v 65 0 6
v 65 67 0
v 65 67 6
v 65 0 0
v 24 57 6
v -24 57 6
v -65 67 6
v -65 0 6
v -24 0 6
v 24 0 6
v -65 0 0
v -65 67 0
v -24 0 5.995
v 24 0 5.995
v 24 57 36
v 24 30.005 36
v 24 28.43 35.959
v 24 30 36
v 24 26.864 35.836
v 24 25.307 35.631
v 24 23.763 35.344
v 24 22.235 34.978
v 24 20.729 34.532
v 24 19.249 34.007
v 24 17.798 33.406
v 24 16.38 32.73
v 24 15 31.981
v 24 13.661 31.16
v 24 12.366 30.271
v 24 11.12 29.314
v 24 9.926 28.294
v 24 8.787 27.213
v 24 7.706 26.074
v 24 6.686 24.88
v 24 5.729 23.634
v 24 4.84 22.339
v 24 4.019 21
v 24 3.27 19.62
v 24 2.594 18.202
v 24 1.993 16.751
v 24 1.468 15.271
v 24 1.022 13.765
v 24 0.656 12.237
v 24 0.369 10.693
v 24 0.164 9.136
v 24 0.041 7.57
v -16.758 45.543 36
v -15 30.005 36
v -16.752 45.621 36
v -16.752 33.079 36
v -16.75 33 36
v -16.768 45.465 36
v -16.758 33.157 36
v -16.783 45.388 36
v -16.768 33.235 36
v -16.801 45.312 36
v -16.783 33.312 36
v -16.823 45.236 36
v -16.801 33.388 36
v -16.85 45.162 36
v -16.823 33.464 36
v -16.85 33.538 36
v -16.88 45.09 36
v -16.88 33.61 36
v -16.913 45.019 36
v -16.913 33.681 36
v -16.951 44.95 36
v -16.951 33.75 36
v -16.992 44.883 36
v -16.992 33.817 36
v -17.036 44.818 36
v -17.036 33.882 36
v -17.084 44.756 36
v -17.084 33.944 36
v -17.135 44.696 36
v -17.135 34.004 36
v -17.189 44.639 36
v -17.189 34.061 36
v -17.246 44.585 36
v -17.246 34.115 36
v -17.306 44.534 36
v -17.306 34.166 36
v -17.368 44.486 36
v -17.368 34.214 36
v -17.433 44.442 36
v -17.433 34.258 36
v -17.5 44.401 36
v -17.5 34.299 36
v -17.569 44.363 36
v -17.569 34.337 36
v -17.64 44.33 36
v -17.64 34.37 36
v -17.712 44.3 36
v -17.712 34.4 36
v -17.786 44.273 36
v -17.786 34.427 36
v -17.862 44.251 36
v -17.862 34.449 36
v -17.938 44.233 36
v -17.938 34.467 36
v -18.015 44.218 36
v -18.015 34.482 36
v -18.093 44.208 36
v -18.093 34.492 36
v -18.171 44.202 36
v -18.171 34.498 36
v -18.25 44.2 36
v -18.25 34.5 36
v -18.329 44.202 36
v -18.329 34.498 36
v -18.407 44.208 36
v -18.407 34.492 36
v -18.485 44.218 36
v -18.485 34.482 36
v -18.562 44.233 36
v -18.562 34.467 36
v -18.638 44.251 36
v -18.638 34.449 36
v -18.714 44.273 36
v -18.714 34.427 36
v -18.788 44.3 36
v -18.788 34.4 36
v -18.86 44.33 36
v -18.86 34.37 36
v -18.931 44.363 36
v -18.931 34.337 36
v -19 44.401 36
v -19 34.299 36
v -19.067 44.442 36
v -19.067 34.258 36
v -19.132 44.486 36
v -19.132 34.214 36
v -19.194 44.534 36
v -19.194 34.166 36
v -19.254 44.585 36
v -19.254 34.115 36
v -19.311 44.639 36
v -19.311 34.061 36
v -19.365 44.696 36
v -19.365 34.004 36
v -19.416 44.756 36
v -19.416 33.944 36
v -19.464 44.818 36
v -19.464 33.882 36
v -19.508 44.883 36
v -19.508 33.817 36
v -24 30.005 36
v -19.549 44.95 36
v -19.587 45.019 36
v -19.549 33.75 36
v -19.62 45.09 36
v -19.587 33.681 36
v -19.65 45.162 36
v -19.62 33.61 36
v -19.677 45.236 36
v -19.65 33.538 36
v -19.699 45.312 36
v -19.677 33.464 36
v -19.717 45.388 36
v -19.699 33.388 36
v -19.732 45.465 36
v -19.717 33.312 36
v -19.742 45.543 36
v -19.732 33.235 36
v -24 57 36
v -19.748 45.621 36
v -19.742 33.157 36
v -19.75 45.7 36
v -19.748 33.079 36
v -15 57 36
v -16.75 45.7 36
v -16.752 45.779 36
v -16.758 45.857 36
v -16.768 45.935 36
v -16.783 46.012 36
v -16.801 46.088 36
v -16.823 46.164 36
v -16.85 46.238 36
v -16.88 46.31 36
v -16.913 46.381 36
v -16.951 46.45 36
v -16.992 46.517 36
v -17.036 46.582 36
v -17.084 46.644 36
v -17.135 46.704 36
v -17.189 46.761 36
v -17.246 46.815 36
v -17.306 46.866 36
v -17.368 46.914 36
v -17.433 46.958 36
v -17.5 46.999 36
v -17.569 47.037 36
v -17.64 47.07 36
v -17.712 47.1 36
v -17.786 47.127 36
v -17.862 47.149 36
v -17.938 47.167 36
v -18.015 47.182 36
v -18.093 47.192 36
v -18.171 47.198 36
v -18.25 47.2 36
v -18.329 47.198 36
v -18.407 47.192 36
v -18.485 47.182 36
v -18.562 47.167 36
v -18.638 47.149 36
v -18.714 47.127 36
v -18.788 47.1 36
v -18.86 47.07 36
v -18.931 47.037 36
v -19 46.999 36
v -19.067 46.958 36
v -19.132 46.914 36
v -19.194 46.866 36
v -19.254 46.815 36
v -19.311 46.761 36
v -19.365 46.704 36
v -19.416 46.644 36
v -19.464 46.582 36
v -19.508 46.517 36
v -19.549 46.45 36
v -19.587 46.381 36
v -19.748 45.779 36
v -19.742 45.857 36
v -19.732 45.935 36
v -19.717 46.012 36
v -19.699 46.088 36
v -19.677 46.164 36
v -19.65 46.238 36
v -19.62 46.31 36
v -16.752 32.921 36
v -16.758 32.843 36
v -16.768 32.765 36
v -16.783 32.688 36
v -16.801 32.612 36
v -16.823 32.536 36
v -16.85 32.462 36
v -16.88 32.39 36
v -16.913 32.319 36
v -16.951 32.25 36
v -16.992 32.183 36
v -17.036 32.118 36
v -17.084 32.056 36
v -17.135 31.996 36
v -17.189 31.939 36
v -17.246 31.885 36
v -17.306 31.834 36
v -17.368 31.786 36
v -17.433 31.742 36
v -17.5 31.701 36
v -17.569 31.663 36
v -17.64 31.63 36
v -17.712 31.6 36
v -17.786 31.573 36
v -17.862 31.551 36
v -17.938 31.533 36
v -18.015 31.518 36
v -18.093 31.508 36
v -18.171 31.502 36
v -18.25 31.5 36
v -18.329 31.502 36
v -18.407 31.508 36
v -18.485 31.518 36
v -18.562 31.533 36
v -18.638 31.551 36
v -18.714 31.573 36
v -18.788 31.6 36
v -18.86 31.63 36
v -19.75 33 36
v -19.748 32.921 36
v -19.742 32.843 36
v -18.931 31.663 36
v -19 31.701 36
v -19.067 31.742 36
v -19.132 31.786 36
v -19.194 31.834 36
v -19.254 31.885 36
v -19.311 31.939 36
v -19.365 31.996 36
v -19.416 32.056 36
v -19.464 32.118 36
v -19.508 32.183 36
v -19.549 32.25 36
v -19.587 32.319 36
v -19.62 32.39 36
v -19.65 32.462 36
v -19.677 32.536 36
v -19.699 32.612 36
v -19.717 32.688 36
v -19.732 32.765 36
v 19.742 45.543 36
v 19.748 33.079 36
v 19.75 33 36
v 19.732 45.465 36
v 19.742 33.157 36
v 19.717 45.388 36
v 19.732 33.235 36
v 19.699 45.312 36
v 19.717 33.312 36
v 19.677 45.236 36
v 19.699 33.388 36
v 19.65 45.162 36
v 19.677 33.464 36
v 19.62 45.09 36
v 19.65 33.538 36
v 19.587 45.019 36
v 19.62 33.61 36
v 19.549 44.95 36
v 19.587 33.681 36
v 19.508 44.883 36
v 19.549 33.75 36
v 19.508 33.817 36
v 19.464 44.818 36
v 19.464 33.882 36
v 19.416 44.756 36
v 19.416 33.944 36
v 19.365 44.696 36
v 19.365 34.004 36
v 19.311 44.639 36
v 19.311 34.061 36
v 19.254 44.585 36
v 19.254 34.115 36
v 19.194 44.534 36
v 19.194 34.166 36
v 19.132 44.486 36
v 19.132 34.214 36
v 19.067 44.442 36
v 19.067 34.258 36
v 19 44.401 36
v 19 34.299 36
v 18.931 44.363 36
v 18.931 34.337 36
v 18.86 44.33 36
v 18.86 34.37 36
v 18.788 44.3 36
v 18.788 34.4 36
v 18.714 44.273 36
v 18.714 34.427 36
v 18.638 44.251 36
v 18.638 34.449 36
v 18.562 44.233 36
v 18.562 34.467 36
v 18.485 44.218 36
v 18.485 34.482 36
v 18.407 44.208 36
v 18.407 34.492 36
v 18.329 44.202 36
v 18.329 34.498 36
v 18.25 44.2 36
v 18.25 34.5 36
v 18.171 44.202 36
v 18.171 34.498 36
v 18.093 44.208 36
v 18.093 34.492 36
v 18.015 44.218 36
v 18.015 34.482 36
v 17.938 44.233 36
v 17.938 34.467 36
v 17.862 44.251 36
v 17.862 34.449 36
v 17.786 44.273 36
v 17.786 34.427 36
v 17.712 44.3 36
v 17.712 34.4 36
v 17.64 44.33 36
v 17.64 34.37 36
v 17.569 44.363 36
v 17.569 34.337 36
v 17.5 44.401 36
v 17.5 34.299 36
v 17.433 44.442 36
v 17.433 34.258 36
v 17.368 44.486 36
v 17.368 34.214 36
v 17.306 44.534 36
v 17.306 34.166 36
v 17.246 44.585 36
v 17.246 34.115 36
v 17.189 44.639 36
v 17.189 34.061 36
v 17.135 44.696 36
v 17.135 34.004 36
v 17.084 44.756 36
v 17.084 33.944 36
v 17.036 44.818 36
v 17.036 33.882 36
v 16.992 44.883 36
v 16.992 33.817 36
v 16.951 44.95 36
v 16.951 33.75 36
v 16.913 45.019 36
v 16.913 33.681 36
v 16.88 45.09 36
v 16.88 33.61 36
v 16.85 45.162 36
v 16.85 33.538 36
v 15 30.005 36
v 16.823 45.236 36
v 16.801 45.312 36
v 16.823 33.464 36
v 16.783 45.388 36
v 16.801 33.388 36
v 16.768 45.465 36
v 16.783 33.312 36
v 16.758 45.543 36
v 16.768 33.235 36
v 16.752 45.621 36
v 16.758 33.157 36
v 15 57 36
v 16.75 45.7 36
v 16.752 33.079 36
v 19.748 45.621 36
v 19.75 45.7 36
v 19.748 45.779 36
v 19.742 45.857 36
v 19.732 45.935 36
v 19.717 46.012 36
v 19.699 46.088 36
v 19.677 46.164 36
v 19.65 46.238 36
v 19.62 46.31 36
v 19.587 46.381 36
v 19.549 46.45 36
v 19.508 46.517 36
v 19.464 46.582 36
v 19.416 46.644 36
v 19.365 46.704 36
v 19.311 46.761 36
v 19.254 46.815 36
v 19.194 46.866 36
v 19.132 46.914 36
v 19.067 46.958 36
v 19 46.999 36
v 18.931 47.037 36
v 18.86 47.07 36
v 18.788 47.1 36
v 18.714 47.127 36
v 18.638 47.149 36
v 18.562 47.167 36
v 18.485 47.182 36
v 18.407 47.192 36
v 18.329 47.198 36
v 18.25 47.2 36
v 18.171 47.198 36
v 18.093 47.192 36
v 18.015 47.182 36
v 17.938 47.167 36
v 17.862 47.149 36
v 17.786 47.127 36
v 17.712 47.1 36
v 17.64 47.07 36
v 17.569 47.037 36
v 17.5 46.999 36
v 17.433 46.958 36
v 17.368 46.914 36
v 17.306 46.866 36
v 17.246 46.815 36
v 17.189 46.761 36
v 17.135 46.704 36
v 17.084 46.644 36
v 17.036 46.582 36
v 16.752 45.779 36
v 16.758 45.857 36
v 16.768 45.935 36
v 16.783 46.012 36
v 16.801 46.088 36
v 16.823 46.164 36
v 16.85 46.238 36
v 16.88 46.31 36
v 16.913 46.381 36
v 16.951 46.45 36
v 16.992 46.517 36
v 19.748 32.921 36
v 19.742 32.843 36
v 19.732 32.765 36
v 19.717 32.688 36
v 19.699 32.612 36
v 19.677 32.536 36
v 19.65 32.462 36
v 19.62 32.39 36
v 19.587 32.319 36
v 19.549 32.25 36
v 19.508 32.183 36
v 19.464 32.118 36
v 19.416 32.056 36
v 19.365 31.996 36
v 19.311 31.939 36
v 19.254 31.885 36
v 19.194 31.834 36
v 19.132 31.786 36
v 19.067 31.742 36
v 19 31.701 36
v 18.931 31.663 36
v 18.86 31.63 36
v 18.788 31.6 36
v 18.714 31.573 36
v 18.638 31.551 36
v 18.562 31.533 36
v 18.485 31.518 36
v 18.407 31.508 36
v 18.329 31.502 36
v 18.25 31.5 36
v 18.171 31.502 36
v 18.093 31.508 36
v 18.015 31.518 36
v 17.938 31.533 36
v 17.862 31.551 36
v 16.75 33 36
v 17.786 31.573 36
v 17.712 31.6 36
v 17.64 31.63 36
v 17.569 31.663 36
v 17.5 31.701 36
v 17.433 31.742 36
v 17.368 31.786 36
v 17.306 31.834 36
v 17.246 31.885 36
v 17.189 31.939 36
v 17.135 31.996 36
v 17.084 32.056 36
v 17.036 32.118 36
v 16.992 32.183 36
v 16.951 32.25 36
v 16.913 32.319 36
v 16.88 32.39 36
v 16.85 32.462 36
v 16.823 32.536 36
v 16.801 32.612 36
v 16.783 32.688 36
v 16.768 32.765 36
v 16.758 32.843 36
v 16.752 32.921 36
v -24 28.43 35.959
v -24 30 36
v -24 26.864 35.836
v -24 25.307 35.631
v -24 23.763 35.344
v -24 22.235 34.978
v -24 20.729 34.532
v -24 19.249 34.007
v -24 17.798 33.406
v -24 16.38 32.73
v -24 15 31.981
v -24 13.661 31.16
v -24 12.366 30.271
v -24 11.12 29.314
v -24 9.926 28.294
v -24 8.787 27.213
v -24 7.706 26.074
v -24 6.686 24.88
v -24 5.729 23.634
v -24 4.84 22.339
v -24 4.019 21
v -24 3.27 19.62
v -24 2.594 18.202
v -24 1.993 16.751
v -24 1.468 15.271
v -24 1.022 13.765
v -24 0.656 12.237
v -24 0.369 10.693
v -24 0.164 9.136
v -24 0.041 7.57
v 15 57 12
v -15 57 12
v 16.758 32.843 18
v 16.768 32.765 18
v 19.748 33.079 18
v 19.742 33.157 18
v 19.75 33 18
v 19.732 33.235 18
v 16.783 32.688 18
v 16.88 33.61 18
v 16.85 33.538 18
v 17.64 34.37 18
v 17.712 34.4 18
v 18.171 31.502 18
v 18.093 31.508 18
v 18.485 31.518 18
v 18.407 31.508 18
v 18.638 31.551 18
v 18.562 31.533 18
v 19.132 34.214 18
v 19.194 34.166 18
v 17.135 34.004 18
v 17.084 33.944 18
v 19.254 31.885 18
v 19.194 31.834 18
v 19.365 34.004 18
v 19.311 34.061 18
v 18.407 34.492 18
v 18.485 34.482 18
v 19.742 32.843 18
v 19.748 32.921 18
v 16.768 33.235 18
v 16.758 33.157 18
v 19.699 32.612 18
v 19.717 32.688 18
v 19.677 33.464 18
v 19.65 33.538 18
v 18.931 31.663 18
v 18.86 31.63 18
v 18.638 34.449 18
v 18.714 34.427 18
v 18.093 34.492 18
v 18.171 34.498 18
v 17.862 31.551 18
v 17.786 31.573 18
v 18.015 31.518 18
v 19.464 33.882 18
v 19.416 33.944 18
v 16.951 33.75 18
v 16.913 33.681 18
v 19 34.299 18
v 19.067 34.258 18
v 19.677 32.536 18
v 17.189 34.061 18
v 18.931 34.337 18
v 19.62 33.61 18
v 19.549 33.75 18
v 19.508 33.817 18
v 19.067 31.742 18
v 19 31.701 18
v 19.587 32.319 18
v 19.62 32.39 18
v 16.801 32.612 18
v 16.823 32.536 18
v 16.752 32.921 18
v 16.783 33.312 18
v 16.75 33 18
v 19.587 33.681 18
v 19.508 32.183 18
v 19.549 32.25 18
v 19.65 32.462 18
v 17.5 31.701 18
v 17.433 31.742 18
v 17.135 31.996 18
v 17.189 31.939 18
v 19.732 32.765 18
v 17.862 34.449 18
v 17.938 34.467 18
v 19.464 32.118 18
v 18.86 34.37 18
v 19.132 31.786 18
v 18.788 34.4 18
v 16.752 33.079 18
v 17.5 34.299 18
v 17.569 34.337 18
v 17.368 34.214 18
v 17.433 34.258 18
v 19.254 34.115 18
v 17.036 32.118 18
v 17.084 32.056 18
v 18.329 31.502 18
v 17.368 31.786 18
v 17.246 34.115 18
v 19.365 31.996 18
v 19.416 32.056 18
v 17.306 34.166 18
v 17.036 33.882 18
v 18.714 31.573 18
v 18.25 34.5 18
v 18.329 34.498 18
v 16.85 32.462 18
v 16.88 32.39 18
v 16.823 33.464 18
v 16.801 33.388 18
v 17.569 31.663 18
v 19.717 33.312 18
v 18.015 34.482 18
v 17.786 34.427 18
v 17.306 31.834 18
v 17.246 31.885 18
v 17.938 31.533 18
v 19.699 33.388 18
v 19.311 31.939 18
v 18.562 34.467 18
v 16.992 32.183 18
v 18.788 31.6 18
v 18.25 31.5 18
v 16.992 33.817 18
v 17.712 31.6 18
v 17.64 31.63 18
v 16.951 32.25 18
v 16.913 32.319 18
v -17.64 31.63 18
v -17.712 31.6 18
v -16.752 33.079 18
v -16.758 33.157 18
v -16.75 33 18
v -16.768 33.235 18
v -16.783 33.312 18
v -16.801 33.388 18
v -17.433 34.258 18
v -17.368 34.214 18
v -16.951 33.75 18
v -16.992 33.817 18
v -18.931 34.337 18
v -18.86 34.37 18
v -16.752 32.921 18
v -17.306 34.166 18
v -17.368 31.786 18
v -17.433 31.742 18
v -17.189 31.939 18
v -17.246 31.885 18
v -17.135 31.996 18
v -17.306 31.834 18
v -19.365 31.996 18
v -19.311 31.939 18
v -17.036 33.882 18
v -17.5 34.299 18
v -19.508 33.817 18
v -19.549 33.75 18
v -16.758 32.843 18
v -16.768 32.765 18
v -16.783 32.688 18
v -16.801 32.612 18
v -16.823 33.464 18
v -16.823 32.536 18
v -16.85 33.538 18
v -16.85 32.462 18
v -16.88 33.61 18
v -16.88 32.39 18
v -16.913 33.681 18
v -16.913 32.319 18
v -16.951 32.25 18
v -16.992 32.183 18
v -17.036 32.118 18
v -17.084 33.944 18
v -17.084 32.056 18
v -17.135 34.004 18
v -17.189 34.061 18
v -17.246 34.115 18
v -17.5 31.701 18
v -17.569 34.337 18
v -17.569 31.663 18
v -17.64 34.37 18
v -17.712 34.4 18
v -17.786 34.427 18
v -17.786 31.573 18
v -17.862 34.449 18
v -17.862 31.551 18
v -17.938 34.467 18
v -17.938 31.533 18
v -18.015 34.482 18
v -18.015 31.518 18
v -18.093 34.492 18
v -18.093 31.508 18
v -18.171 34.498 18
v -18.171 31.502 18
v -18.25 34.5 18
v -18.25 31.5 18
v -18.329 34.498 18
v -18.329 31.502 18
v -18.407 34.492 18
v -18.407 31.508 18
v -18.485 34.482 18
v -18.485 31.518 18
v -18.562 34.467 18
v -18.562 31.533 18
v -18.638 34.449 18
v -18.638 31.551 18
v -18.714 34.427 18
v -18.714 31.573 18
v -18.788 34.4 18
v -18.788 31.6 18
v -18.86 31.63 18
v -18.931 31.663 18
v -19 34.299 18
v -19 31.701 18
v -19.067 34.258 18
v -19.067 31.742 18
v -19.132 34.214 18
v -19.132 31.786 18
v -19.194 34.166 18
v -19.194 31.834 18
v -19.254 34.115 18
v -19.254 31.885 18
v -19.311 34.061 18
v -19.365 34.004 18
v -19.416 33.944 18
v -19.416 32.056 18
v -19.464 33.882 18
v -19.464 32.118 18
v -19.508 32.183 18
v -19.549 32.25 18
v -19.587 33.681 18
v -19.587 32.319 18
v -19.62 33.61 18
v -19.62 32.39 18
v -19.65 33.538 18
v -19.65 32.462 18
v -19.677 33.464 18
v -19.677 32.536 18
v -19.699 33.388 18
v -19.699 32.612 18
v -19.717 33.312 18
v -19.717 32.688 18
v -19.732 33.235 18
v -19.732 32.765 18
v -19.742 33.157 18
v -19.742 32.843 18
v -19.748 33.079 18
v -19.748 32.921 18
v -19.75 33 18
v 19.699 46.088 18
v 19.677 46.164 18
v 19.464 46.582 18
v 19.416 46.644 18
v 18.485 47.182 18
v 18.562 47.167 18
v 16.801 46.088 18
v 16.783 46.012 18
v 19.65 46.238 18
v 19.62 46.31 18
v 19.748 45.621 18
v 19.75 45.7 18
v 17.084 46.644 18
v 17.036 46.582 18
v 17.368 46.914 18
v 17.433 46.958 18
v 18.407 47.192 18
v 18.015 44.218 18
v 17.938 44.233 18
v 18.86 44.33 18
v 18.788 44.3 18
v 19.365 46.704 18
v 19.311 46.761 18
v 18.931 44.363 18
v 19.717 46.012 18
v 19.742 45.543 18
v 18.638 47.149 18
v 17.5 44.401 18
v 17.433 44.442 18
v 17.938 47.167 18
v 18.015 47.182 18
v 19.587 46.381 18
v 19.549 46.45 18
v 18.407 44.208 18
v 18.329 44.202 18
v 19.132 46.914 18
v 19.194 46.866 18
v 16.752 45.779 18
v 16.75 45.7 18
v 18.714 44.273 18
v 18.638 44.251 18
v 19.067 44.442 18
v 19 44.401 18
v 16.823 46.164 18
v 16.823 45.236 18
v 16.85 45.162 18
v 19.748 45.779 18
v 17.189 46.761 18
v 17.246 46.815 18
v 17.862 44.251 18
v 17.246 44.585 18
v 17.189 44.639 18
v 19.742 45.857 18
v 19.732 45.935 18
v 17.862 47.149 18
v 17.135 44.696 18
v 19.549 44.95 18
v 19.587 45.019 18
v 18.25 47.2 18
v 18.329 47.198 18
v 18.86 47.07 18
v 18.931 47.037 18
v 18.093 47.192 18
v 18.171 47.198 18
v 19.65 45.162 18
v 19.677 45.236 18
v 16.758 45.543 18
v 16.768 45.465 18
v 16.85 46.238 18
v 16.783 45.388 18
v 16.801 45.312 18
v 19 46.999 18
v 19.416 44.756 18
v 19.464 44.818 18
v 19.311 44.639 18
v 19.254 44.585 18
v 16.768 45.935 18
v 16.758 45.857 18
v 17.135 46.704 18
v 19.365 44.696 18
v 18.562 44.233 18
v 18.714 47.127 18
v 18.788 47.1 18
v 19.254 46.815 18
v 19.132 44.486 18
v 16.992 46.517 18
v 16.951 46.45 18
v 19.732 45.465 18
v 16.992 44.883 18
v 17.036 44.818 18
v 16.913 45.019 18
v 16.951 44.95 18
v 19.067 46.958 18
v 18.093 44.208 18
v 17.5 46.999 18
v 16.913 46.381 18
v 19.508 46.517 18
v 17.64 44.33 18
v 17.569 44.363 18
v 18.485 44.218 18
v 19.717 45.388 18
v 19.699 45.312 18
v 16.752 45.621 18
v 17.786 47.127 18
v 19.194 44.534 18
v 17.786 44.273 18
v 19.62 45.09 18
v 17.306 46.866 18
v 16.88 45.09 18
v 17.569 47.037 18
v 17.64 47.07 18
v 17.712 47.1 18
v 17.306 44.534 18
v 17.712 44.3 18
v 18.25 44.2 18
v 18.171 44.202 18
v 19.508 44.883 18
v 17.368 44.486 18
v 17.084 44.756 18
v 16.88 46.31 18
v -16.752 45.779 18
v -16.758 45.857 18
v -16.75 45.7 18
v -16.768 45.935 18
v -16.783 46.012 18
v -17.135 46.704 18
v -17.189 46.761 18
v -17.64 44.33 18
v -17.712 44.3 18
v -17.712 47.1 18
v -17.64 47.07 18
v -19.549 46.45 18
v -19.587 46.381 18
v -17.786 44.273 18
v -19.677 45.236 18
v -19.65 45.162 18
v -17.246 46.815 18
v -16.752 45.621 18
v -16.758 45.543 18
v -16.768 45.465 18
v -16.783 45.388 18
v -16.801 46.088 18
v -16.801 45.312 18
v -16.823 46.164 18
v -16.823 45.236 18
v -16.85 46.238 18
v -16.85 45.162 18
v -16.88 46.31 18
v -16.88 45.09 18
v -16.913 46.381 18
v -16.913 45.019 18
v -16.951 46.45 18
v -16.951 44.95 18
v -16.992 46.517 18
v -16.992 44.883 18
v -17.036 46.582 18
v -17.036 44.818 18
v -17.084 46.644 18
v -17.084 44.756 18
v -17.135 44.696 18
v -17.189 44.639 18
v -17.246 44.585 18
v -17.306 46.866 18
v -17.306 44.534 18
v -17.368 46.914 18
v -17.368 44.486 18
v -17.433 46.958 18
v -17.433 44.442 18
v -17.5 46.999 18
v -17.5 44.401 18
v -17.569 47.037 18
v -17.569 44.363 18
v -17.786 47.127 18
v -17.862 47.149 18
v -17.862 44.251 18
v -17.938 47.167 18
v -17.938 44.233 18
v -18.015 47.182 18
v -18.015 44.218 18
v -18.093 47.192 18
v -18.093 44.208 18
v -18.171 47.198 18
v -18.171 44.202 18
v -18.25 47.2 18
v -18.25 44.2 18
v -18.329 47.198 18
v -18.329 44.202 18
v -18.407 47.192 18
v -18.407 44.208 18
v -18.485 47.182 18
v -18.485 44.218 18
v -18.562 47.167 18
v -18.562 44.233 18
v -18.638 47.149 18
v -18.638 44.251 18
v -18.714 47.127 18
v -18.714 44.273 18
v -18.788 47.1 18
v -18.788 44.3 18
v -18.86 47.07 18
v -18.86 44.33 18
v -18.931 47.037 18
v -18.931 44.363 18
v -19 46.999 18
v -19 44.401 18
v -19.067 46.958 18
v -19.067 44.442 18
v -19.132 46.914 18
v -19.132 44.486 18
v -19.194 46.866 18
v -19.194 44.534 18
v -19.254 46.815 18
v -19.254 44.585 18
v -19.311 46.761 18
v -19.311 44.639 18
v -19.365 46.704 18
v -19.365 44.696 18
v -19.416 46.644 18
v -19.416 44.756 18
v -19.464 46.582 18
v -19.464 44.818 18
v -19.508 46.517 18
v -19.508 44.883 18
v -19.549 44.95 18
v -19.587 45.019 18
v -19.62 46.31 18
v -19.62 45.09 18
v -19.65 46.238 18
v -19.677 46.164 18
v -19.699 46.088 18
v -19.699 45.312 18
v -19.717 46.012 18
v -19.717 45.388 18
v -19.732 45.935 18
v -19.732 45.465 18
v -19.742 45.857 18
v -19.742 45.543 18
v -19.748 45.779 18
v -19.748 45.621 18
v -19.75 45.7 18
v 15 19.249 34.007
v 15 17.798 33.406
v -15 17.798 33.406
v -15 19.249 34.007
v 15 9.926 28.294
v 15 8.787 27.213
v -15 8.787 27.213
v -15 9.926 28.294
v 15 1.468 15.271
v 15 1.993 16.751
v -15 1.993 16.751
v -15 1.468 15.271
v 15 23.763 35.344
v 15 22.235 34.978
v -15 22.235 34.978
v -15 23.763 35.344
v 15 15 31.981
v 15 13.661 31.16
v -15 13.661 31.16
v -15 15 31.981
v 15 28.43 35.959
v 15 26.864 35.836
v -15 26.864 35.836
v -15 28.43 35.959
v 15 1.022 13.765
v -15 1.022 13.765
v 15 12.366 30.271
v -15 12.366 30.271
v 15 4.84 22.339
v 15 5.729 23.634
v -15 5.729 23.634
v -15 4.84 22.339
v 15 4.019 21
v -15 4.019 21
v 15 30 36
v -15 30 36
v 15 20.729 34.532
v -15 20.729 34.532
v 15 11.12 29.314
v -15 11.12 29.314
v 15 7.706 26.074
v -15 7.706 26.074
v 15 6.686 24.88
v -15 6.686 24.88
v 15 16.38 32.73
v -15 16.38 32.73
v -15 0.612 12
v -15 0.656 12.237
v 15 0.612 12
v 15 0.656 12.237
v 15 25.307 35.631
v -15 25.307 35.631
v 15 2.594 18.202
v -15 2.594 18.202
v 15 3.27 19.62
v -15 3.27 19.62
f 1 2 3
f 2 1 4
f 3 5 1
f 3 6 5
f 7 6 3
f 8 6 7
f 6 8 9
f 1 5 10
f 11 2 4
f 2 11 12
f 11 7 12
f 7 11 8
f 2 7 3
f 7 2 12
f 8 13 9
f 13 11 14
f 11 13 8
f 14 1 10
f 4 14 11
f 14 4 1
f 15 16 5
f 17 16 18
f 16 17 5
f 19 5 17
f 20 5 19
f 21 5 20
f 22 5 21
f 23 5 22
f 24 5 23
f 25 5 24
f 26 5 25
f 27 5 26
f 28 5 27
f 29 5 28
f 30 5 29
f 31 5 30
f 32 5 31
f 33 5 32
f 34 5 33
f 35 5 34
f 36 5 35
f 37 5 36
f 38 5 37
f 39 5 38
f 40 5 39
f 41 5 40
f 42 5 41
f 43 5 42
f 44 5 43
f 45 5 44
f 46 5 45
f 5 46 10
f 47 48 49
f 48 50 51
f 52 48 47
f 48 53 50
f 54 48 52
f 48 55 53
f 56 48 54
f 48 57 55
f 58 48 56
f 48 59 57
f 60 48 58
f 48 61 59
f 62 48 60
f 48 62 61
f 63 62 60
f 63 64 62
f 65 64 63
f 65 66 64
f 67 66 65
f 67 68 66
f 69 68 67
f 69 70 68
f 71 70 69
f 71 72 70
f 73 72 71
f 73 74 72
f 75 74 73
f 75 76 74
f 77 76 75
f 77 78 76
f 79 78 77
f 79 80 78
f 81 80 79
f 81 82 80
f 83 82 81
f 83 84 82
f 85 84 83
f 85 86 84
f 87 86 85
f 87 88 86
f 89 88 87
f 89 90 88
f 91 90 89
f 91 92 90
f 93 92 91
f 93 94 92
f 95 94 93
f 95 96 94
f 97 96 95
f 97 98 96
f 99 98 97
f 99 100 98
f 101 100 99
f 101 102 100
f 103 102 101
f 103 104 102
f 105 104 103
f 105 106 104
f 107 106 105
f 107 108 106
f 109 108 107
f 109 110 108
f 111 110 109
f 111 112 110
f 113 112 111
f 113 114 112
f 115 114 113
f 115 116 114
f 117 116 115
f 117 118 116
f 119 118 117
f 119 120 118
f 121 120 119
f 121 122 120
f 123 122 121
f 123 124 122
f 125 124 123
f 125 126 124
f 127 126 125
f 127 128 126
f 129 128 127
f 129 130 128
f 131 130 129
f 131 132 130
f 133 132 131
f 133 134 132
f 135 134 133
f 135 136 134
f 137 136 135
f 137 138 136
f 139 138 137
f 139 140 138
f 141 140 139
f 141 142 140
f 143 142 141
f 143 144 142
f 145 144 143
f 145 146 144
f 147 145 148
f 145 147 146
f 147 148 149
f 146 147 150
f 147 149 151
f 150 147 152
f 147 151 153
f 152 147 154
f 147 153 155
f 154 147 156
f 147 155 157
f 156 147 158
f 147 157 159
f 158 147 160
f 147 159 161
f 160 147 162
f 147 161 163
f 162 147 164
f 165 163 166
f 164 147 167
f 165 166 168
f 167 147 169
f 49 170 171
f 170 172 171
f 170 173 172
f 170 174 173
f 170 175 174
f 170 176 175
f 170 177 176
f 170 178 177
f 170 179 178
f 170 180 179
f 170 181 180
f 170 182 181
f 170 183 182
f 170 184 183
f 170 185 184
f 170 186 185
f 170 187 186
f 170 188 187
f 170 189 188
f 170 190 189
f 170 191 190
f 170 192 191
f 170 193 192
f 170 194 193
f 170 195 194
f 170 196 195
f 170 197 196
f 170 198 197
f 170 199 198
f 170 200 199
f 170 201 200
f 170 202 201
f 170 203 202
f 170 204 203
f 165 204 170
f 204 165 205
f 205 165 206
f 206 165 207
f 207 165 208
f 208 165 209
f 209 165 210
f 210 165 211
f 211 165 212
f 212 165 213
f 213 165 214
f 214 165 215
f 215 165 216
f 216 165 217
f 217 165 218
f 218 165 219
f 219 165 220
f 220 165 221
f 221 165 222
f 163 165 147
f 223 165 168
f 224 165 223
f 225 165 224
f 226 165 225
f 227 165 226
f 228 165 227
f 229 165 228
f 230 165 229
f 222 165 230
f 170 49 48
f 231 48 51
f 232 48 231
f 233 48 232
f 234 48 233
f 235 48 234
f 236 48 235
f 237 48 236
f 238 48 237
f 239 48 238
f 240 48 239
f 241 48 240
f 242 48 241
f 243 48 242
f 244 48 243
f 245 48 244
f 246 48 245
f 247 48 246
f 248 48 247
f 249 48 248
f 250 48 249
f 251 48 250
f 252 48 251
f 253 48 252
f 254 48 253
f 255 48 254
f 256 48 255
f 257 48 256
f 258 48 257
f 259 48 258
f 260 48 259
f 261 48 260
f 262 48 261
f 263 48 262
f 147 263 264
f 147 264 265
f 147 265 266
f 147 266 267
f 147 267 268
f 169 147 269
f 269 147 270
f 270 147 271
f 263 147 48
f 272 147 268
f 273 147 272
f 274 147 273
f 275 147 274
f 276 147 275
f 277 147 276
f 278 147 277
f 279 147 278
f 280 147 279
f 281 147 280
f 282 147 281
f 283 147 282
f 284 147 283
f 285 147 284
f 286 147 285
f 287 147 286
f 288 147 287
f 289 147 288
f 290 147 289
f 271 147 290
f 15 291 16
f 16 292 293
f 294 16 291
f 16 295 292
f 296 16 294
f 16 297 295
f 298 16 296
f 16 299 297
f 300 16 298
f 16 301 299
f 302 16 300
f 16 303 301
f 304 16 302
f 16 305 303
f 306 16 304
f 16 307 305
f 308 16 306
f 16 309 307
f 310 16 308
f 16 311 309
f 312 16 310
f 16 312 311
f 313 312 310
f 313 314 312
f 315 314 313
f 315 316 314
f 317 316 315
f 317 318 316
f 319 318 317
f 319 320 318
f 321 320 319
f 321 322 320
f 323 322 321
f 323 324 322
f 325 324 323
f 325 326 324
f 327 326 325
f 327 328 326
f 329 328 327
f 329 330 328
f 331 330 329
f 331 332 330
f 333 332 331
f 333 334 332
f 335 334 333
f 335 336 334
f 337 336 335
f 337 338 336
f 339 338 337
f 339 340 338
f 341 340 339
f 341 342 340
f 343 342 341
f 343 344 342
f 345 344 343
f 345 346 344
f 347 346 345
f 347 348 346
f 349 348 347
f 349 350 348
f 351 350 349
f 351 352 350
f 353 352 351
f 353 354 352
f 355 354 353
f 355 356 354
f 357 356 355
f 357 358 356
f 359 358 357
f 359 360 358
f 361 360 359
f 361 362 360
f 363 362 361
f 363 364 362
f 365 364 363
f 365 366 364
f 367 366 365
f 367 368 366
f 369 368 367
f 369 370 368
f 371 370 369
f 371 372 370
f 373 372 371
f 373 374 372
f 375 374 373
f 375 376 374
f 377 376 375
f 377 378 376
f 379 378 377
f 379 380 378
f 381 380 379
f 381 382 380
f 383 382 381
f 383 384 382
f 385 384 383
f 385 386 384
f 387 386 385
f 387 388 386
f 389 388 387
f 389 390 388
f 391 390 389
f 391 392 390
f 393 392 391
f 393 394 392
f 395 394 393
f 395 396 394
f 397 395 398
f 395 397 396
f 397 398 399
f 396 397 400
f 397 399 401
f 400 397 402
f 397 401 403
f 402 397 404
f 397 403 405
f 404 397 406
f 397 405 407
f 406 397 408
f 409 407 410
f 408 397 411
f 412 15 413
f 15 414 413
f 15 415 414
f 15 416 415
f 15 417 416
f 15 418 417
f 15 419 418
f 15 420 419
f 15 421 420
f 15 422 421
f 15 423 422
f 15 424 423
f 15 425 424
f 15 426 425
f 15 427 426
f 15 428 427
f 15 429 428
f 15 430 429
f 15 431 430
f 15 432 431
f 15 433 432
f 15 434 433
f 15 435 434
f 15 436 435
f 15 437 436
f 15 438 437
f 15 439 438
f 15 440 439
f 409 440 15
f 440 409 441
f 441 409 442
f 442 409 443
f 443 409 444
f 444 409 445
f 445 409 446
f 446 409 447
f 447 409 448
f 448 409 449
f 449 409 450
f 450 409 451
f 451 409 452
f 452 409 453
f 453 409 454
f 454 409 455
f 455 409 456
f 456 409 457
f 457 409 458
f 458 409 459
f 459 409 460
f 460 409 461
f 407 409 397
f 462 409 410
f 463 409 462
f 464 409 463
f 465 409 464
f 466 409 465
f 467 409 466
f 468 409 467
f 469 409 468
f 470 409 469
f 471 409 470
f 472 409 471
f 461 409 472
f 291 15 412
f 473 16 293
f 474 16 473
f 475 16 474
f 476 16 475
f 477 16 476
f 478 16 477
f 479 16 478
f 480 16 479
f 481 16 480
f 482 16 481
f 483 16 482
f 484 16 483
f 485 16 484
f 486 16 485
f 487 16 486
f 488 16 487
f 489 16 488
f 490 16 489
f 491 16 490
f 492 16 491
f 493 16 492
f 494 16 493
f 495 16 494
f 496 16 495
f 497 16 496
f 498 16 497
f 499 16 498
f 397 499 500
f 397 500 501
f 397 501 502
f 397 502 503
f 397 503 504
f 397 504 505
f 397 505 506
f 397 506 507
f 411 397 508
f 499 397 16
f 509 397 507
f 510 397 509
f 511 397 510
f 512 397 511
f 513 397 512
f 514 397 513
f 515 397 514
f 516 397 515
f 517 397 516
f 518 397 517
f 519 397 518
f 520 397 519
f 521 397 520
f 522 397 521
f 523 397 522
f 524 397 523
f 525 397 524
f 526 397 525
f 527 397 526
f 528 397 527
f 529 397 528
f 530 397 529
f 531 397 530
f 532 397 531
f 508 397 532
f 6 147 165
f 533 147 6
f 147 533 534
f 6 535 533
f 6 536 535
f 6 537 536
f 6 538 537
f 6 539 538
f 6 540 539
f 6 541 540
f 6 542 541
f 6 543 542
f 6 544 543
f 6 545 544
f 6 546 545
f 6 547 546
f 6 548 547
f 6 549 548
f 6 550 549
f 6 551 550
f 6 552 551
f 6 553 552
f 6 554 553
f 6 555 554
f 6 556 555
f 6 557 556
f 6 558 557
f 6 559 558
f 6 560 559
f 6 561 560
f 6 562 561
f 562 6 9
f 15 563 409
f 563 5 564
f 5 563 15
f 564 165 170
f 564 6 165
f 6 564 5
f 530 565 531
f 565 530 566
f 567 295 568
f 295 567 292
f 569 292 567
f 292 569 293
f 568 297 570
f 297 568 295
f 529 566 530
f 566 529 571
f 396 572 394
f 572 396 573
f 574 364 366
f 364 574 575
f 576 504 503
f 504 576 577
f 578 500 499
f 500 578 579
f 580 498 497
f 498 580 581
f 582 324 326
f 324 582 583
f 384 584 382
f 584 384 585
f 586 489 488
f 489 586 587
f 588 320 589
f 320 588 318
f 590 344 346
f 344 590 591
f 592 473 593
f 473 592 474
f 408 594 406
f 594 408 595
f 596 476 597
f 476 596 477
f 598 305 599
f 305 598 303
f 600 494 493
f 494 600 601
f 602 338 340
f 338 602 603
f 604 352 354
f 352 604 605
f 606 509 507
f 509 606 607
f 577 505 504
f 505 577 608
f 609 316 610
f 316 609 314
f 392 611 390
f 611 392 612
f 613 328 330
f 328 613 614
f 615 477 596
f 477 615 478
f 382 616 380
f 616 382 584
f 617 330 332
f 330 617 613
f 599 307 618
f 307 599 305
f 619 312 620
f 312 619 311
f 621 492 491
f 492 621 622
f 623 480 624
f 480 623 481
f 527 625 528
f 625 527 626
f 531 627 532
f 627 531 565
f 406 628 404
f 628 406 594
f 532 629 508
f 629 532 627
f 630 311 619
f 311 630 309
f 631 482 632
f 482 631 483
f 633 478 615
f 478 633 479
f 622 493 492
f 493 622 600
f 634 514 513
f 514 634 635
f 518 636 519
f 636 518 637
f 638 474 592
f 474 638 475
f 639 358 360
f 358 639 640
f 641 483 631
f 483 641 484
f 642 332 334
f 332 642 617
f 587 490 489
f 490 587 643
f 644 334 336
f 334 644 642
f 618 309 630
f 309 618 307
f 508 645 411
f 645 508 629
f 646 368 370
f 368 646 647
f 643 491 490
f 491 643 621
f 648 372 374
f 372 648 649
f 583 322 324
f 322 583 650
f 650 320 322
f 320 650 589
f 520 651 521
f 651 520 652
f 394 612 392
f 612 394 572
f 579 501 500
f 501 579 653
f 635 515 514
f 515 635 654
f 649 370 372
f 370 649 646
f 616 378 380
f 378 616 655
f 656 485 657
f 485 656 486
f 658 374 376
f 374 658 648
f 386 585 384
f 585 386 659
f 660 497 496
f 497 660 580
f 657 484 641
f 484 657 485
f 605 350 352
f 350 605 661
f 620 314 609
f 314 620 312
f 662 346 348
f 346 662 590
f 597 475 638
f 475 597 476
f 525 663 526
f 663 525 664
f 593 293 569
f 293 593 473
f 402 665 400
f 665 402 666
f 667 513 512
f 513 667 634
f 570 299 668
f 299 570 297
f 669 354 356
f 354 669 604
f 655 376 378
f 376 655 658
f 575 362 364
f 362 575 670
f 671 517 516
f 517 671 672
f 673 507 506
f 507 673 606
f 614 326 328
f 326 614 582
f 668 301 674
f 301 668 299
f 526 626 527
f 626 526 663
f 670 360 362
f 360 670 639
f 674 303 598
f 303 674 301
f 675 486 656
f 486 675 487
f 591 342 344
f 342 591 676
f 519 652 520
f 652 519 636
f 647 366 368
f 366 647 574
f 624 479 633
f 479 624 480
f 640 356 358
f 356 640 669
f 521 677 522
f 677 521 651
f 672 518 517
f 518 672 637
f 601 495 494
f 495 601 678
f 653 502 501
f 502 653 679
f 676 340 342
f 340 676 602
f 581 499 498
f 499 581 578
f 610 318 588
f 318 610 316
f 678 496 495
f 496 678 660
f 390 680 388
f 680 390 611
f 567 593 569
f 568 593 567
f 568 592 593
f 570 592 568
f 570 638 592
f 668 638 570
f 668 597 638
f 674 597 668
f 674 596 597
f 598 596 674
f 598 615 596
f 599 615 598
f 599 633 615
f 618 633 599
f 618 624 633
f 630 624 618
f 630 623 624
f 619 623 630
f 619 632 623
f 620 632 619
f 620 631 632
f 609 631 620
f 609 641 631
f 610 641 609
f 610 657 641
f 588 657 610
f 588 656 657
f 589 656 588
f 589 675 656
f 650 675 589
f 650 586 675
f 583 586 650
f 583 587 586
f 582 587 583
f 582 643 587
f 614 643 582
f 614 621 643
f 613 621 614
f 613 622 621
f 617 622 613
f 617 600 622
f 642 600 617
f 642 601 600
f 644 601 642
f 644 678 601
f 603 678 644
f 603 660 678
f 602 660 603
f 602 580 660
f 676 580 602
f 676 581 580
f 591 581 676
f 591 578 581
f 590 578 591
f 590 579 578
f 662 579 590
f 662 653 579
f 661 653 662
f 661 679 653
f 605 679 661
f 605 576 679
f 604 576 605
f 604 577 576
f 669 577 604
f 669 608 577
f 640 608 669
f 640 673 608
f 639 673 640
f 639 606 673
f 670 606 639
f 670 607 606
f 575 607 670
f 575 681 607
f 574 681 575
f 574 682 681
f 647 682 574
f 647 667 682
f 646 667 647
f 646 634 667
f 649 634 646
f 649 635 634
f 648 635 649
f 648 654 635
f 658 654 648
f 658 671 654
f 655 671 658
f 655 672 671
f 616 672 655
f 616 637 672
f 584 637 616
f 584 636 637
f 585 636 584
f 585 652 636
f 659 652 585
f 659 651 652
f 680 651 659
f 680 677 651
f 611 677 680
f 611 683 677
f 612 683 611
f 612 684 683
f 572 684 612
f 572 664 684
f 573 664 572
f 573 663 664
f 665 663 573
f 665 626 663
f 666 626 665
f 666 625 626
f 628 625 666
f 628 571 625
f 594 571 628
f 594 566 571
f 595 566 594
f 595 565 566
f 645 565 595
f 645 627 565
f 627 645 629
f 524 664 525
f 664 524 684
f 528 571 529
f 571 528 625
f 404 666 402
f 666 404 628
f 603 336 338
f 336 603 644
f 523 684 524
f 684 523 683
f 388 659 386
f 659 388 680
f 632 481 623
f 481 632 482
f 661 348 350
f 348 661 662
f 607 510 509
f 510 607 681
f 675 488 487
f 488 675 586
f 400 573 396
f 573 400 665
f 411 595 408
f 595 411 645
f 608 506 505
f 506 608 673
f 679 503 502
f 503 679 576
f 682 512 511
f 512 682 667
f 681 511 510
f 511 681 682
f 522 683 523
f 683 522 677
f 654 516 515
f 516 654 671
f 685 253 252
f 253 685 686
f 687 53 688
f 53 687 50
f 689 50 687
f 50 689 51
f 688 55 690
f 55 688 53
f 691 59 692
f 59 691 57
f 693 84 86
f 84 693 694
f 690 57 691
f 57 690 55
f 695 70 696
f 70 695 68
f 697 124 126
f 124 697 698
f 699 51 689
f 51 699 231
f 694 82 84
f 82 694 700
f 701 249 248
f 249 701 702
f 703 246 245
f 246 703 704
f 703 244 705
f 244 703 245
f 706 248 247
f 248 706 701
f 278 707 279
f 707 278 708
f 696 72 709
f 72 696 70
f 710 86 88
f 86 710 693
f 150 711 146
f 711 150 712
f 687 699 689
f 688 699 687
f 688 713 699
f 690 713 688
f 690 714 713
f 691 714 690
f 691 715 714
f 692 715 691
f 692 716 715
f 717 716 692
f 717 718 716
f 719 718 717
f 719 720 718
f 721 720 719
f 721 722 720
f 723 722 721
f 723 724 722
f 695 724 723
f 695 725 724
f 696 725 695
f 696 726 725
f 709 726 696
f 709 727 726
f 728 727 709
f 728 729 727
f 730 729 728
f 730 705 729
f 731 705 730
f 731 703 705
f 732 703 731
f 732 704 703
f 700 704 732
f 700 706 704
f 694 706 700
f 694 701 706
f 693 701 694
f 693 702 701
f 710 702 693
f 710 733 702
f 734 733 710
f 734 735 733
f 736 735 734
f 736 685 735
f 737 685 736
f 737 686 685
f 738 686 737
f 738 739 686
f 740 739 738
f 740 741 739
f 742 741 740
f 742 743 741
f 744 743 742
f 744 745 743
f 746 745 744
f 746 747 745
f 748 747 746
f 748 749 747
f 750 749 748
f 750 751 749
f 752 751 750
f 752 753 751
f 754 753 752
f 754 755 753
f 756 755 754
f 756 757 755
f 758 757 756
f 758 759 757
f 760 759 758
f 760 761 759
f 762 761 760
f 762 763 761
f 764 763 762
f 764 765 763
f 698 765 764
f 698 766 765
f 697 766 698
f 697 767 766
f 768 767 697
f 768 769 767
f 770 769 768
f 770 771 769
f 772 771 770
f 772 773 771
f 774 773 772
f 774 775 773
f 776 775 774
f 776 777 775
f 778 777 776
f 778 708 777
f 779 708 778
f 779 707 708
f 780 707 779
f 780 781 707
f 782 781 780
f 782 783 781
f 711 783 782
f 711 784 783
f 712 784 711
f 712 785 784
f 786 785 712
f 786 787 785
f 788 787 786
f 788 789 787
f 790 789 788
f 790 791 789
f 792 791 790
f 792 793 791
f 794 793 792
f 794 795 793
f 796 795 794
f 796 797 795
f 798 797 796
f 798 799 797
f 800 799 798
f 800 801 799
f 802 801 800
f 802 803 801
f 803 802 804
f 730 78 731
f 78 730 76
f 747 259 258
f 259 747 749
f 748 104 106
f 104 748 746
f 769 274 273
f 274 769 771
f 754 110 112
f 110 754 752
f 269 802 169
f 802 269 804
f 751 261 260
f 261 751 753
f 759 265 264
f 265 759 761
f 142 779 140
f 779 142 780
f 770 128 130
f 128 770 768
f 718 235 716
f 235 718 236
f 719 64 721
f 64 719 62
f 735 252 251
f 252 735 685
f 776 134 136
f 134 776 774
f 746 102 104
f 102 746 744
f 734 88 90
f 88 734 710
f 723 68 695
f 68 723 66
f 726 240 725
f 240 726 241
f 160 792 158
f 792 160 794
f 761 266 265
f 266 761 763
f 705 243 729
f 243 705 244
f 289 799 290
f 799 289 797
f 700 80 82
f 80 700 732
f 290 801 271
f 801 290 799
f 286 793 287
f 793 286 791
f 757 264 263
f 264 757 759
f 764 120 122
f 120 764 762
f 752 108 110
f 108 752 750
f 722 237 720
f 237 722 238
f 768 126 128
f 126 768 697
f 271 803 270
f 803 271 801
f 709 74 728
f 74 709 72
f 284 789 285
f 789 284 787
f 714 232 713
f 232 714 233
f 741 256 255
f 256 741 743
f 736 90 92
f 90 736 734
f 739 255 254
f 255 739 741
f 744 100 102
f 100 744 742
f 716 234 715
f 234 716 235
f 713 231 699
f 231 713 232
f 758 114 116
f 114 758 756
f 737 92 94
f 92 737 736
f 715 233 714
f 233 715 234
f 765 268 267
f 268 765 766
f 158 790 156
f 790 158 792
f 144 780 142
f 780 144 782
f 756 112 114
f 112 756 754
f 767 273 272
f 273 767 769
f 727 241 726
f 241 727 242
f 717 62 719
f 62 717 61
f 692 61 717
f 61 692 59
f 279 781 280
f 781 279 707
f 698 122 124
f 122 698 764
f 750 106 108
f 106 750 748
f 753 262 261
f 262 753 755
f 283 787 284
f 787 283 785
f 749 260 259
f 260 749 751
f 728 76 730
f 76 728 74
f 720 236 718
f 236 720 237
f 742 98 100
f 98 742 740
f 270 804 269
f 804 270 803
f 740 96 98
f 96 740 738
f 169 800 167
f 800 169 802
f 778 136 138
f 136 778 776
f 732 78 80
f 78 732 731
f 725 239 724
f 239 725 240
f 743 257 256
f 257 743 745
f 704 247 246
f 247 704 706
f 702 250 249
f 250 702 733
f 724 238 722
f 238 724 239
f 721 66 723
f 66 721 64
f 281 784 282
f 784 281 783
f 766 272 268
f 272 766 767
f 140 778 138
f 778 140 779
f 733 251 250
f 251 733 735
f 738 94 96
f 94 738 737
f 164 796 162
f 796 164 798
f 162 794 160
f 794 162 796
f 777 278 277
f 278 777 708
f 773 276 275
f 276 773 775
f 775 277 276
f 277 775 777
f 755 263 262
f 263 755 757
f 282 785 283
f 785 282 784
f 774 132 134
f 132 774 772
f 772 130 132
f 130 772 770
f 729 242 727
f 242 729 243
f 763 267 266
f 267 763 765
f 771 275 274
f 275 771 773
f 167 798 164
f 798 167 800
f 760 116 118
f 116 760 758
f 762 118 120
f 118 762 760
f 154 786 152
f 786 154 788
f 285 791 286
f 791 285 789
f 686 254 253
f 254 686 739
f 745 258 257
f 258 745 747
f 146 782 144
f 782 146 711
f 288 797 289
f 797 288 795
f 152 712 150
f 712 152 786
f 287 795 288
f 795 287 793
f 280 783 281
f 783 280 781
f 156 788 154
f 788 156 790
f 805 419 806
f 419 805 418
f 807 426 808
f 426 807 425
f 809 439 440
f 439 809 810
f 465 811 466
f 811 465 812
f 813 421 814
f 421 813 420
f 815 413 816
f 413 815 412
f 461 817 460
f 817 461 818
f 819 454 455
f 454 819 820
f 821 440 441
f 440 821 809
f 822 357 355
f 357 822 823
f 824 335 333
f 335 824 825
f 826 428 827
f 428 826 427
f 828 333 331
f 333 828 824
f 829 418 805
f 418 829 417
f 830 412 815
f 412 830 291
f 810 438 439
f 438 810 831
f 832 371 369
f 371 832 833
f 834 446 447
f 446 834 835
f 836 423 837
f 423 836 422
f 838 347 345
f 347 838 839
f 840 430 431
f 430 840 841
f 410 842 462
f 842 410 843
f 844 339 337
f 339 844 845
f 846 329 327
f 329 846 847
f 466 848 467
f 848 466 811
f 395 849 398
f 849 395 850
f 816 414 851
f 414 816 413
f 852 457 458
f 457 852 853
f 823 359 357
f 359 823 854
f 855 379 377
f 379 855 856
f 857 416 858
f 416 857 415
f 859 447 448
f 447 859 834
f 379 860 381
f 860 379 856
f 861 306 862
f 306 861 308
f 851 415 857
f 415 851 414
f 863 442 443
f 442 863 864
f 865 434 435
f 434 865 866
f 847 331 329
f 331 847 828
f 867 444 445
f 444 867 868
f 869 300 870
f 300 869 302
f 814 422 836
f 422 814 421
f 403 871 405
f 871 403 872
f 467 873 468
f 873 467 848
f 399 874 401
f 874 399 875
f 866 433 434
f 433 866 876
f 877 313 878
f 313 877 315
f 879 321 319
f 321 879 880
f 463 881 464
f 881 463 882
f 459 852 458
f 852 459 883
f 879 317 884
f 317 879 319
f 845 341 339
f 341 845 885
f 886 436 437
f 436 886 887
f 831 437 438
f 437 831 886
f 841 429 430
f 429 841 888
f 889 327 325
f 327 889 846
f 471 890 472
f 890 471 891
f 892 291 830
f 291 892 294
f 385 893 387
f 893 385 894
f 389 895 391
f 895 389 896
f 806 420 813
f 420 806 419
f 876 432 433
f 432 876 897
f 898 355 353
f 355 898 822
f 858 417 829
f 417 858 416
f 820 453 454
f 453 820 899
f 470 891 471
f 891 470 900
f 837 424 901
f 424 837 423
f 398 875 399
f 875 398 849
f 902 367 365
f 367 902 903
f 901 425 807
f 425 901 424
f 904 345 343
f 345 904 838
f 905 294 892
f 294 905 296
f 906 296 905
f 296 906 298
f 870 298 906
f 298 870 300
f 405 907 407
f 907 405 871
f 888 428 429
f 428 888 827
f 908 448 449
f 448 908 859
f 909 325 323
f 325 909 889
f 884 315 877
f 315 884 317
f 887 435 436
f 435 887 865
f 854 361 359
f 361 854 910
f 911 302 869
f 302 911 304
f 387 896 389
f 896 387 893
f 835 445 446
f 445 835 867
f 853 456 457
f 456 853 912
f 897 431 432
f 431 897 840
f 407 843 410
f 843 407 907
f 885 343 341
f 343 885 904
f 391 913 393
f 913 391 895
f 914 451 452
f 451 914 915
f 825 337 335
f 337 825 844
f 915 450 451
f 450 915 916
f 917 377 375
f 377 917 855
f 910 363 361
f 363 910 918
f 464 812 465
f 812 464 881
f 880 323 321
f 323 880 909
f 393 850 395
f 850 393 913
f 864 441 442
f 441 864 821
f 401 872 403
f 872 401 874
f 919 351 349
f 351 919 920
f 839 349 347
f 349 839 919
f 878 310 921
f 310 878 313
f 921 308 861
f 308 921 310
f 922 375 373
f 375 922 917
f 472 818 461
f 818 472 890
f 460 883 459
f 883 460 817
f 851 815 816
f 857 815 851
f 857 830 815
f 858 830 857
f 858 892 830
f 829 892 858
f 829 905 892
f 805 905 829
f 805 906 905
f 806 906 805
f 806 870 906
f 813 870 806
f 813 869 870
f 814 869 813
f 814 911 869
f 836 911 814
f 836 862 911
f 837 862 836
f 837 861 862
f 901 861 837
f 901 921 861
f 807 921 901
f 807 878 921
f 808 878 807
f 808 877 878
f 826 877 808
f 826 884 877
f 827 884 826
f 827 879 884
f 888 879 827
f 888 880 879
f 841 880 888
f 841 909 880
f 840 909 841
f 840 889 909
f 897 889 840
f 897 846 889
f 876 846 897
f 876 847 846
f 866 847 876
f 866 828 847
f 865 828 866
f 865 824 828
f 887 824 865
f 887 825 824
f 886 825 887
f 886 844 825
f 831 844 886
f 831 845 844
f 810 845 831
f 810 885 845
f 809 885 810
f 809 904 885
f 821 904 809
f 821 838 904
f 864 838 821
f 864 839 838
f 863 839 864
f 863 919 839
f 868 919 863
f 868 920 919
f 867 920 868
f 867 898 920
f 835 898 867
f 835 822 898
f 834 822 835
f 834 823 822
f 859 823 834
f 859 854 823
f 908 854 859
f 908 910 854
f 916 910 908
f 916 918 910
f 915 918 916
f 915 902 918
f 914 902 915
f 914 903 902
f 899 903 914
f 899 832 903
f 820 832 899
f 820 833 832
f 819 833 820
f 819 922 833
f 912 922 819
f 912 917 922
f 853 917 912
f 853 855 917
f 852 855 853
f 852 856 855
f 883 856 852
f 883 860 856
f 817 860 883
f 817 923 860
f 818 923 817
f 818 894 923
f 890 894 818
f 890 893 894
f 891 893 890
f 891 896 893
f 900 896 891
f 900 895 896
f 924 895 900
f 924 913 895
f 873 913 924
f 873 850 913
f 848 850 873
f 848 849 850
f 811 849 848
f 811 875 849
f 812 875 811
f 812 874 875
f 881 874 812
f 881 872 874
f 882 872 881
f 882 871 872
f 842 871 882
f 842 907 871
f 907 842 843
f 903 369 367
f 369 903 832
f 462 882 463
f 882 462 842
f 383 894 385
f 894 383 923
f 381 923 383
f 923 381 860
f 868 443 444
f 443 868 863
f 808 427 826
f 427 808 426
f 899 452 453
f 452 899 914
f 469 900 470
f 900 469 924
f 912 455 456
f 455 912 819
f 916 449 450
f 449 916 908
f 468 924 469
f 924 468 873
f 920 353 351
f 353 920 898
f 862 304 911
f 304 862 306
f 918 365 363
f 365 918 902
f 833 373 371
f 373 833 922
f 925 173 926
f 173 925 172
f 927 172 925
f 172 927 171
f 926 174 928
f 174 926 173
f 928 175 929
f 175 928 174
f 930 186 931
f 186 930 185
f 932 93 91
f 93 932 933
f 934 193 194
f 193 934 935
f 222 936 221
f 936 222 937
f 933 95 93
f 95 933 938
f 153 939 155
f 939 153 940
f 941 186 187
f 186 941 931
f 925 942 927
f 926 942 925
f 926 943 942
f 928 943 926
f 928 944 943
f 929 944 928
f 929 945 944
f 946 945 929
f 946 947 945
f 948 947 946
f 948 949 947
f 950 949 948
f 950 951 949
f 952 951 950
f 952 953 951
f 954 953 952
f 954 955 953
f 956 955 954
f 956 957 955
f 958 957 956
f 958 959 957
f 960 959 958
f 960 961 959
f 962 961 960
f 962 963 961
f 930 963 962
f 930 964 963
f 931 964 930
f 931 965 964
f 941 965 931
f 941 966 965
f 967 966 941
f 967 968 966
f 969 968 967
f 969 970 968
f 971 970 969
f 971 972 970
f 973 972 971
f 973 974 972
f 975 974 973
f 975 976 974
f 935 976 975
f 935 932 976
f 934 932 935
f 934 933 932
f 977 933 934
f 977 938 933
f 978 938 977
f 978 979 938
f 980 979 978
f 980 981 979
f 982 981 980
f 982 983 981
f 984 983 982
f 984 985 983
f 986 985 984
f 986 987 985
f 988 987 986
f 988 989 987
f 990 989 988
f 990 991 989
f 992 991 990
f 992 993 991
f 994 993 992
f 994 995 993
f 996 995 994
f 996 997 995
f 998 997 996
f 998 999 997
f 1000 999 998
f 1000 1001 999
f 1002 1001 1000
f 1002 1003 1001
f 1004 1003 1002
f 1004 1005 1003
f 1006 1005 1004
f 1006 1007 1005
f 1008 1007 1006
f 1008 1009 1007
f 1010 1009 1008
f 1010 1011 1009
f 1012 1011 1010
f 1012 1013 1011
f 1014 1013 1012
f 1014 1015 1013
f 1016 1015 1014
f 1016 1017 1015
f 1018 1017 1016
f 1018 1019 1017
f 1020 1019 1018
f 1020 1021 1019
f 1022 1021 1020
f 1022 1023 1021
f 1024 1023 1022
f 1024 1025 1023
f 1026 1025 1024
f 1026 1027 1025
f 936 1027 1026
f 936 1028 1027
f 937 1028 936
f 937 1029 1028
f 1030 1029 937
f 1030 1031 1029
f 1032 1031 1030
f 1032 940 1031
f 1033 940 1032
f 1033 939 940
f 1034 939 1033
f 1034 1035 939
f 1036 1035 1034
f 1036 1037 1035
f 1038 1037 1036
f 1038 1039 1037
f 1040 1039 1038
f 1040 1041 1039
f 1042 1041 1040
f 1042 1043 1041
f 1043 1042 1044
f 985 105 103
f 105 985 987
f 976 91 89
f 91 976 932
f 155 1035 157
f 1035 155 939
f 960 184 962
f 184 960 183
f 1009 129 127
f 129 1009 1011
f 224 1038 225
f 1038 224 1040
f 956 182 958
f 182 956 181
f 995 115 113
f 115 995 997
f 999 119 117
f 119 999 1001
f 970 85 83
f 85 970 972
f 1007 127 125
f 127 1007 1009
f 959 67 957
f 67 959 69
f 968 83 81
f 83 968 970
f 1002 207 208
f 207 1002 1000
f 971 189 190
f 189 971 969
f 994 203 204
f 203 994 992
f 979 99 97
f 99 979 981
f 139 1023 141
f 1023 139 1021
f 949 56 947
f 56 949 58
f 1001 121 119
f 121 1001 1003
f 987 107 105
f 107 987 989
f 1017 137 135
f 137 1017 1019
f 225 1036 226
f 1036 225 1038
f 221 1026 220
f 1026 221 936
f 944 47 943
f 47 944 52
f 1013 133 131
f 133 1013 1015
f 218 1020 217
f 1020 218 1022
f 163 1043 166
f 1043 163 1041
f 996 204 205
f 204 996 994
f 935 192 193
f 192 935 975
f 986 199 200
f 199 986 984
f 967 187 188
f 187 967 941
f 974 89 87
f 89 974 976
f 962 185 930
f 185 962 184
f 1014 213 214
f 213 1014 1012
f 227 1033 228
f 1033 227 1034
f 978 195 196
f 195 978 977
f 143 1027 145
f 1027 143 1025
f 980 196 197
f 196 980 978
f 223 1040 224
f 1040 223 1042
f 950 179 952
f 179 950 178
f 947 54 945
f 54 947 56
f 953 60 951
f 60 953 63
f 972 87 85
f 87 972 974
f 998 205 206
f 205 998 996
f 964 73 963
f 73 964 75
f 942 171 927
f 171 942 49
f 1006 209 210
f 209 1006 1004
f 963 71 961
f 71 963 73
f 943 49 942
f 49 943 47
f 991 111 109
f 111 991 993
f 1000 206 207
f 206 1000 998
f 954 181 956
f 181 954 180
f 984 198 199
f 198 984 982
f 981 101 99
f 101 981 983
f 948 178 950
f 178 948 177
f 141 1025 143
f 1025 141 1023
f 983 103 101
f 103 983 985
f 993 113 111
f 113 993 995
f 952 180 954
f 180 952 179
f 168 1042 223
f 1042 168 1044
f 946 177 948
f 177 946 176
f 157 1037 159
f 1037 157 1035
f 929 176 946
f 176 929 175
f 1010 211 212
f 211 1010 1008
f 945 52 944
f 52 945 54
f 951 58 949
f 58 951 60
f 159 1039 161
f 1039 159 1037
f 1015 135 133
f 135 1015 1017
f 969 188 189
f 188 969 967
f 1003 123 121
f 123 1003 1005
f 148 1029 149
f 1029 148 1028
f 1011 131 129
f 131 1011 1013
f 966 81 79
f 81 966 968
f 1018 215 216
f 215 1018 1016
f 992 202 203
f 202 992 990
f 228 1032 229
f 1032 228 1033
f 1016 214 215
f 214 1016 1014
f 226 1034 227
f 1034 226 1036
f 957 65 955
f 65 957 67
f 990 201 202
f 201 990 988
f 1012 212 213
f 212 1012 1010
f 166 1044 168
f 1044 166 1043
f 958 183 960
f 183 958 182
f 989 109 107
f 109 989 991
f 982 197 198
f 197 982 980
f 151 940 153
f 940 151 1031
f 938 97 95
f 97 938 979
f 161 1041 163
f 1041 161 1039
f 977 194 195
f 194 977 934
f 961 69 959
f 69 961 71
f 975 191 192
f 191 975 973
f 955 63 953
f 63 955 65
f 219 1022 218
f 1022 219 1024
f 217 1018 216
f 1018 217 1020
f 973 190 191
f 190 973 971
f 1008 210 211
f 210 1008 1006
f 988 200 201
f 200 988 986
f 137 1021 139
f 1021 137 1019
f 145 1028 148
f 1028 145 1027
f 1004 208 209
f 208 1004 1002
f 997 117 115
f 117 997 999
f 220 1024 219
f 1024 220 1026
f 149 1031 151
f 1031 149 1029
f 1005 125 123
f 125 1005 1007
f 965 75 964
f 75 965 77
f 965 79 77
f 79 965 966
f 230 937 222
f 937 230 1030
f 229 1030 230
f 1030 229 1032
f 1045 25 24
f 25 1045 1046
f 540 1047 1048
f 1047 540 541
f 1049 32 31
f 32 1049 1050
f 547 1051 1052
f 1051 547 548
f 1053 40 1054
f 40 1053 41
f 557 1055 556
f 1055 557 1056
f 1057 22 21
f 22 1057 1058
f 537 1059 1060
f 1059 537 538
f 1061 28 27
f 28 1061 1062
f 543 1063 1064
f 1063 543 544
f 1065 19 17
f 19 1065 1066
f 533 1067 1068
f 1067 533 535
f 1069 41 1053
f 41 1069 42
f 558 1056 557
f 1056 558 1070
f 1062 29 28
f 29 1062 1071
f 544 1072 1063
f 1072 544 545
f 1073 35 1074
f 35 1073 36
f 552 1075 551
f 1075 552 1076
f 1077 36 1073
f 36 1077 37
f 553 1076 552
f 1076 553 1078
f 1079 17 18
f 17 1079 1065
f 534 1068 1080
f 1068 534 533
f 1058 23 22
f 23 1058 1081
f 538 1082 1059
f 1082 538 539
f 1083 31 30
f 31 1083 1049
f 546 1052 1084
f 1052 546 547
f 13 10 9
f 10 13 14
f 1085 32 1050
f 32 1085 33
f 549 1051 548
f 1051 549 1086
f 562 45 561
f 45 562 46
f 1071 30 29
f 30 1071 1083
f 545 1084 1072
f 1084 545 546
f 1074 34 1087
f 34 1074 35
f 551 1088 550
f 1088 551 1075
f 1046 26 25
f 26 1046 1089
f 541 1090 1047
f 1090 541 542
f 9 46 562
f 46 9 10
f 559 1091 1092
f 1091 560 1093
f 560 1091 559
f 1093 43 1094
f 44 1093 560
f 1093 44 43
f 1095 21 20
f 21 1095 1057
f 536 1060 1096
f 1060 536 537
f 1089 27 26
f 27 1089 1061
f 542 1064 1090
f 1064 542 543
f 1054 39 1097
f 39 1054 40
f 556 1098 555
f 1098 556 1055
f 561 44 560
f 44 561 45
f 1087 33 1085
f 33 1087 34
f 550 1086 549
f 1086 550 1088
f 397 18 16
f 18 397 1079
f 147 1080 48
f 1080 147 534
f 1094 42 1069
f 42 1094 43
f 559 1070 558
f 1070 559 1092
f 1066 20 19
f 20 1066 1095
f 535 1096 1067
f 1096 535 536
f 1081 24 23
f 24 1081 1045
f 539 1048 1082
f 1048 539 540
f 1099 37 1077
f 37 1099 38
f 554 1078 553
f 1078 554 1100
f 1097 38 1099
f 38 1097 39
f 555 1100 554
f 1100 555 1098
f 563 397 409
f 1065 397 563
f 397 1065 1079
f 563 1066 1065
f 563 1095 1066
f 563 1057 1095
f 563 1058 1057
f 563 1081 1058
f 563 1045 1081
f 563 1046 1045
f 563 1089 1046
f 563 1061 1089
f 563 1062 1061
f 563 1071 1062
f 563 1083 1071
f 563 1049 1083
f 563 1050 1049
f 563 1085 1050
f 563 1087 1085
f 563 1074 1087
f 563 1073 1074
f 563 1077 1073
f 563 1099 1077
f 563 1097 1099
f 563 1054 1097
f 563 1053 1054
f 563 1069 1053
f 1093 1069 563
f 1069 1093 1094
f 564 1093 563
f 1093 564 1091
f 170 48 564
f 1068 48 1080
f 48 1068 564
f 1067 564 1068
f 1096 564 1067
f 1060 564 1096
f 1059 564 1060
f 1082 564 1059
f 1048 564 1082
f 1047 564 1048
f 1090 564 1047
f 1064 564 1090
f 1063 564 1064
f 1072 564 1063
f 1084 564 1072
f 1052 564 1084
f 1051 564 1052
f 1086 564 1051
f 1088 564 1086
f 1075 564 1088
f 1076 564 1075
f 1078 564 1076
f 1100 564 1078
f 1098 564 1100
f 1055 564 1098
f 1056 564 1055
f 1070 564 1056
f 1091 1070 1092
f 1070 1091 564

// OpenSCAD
// MIT licence copyright 2025 Jim Dodgen

$fn=120;

base_x= 130;  // width
base_y=67;      // depth
base_z=6;  // thickness/height

mount_x = 48;
mount_y = 57;
mount_z_raw = 30;
mount_z = base_z + mount_z_raw; // makes simpler code
cutout_x = 30; // fox and jonson 32, mccoy-35 33.5, mccoy-19 30
cutout_z = 24; // fox combat special 16.4; Jonson ss 24
//screw_spread_y = 0.625 * 2.54 * 10;  // 5/8 inch;
screw_spread_y = 0.5 * 2.54 * 10;  // 1/2 inch;
echo("screw_spread_y", screw_spread_y);
screw_spread_x = 36.5; //  fox combat special 38.2;  Johnson SS 41.1,  mccoy-35 40, mccoy-19 36.5
offset_from_edge = 33;
hole_d=3;
chop_bottom=false;
difference()
{
    union()
    {
        base();
        mount();
    }
    color("green") cutout();
    holes();
    rounding();
    if (chop_bottom == true)
        translate([0,base_y/2,(mount_z/2)-60])
            cube([base_x,base_y,100], center=true);
}
module holes(offset_from_edge=offset_from_edge, 
        screw_spread_y=screw_spread_y,screw_spread_x=screw_spread_x,hole_d=hole_d)
{
    translate([screw_spread_x/2, offset_from_edge, mount_z/2])
        cylinder(d=hole_d, h=mount_z);
    translate([-screw_spread_x/2, offset_from_edge, mount_z/2])
        cylinder(d=hole_d, h=mount_z);
    translate([screw_spread_x/2, offset_from_edge+screw_spread_y, mount_z/2])
        cylinder(d=hole_d, h=mount_z);
    translate([-screw_spread_x/2, offset_from_edge+screw_spread_y, mount_z/2])
        cylinder(d=hole_d, h=mount_z);
}

module base(base_x=base_x, base_y=base_y, base_z=base_z)
{
    translate([0,base_y/2,base_z/2])
        cube ([base_x,base_y,base_z], center=true);
}

module mount(mount_x=mount_x, mount_y=mount_y, mount_z=mount_z)
{
    translate([0,mount_y/2,mount_z/2])
        cube ([mount_x,mount_y,mount_z], center=true);
}

module cutout(cutout_x=cutout_x, mount_y=mount_y, cutout_z=cutout_z)
{
    translate([0, mount_y/2, mount_z-(cutout_z/2)])
        cube ([cutout_x,mount_y,cutout_z], center=true);
}

module rounding()
{
    translate([-mount_x/2,0,mount_z])
        rotate([0,90,0])
            fillet(0,r=mount_z_raw,h=mount_x);
}

module fillet(rot, r, h) {
    translate([r / 2, r / 2, h/2])
    rotate([0,0,rot]) difference() {
        cube([r + 0.01, r + 0.01, h], center = true);
        translate([r/2, r/2, 0])
            cylinder(r = r, h = h + 1, center = true);
    }
}
